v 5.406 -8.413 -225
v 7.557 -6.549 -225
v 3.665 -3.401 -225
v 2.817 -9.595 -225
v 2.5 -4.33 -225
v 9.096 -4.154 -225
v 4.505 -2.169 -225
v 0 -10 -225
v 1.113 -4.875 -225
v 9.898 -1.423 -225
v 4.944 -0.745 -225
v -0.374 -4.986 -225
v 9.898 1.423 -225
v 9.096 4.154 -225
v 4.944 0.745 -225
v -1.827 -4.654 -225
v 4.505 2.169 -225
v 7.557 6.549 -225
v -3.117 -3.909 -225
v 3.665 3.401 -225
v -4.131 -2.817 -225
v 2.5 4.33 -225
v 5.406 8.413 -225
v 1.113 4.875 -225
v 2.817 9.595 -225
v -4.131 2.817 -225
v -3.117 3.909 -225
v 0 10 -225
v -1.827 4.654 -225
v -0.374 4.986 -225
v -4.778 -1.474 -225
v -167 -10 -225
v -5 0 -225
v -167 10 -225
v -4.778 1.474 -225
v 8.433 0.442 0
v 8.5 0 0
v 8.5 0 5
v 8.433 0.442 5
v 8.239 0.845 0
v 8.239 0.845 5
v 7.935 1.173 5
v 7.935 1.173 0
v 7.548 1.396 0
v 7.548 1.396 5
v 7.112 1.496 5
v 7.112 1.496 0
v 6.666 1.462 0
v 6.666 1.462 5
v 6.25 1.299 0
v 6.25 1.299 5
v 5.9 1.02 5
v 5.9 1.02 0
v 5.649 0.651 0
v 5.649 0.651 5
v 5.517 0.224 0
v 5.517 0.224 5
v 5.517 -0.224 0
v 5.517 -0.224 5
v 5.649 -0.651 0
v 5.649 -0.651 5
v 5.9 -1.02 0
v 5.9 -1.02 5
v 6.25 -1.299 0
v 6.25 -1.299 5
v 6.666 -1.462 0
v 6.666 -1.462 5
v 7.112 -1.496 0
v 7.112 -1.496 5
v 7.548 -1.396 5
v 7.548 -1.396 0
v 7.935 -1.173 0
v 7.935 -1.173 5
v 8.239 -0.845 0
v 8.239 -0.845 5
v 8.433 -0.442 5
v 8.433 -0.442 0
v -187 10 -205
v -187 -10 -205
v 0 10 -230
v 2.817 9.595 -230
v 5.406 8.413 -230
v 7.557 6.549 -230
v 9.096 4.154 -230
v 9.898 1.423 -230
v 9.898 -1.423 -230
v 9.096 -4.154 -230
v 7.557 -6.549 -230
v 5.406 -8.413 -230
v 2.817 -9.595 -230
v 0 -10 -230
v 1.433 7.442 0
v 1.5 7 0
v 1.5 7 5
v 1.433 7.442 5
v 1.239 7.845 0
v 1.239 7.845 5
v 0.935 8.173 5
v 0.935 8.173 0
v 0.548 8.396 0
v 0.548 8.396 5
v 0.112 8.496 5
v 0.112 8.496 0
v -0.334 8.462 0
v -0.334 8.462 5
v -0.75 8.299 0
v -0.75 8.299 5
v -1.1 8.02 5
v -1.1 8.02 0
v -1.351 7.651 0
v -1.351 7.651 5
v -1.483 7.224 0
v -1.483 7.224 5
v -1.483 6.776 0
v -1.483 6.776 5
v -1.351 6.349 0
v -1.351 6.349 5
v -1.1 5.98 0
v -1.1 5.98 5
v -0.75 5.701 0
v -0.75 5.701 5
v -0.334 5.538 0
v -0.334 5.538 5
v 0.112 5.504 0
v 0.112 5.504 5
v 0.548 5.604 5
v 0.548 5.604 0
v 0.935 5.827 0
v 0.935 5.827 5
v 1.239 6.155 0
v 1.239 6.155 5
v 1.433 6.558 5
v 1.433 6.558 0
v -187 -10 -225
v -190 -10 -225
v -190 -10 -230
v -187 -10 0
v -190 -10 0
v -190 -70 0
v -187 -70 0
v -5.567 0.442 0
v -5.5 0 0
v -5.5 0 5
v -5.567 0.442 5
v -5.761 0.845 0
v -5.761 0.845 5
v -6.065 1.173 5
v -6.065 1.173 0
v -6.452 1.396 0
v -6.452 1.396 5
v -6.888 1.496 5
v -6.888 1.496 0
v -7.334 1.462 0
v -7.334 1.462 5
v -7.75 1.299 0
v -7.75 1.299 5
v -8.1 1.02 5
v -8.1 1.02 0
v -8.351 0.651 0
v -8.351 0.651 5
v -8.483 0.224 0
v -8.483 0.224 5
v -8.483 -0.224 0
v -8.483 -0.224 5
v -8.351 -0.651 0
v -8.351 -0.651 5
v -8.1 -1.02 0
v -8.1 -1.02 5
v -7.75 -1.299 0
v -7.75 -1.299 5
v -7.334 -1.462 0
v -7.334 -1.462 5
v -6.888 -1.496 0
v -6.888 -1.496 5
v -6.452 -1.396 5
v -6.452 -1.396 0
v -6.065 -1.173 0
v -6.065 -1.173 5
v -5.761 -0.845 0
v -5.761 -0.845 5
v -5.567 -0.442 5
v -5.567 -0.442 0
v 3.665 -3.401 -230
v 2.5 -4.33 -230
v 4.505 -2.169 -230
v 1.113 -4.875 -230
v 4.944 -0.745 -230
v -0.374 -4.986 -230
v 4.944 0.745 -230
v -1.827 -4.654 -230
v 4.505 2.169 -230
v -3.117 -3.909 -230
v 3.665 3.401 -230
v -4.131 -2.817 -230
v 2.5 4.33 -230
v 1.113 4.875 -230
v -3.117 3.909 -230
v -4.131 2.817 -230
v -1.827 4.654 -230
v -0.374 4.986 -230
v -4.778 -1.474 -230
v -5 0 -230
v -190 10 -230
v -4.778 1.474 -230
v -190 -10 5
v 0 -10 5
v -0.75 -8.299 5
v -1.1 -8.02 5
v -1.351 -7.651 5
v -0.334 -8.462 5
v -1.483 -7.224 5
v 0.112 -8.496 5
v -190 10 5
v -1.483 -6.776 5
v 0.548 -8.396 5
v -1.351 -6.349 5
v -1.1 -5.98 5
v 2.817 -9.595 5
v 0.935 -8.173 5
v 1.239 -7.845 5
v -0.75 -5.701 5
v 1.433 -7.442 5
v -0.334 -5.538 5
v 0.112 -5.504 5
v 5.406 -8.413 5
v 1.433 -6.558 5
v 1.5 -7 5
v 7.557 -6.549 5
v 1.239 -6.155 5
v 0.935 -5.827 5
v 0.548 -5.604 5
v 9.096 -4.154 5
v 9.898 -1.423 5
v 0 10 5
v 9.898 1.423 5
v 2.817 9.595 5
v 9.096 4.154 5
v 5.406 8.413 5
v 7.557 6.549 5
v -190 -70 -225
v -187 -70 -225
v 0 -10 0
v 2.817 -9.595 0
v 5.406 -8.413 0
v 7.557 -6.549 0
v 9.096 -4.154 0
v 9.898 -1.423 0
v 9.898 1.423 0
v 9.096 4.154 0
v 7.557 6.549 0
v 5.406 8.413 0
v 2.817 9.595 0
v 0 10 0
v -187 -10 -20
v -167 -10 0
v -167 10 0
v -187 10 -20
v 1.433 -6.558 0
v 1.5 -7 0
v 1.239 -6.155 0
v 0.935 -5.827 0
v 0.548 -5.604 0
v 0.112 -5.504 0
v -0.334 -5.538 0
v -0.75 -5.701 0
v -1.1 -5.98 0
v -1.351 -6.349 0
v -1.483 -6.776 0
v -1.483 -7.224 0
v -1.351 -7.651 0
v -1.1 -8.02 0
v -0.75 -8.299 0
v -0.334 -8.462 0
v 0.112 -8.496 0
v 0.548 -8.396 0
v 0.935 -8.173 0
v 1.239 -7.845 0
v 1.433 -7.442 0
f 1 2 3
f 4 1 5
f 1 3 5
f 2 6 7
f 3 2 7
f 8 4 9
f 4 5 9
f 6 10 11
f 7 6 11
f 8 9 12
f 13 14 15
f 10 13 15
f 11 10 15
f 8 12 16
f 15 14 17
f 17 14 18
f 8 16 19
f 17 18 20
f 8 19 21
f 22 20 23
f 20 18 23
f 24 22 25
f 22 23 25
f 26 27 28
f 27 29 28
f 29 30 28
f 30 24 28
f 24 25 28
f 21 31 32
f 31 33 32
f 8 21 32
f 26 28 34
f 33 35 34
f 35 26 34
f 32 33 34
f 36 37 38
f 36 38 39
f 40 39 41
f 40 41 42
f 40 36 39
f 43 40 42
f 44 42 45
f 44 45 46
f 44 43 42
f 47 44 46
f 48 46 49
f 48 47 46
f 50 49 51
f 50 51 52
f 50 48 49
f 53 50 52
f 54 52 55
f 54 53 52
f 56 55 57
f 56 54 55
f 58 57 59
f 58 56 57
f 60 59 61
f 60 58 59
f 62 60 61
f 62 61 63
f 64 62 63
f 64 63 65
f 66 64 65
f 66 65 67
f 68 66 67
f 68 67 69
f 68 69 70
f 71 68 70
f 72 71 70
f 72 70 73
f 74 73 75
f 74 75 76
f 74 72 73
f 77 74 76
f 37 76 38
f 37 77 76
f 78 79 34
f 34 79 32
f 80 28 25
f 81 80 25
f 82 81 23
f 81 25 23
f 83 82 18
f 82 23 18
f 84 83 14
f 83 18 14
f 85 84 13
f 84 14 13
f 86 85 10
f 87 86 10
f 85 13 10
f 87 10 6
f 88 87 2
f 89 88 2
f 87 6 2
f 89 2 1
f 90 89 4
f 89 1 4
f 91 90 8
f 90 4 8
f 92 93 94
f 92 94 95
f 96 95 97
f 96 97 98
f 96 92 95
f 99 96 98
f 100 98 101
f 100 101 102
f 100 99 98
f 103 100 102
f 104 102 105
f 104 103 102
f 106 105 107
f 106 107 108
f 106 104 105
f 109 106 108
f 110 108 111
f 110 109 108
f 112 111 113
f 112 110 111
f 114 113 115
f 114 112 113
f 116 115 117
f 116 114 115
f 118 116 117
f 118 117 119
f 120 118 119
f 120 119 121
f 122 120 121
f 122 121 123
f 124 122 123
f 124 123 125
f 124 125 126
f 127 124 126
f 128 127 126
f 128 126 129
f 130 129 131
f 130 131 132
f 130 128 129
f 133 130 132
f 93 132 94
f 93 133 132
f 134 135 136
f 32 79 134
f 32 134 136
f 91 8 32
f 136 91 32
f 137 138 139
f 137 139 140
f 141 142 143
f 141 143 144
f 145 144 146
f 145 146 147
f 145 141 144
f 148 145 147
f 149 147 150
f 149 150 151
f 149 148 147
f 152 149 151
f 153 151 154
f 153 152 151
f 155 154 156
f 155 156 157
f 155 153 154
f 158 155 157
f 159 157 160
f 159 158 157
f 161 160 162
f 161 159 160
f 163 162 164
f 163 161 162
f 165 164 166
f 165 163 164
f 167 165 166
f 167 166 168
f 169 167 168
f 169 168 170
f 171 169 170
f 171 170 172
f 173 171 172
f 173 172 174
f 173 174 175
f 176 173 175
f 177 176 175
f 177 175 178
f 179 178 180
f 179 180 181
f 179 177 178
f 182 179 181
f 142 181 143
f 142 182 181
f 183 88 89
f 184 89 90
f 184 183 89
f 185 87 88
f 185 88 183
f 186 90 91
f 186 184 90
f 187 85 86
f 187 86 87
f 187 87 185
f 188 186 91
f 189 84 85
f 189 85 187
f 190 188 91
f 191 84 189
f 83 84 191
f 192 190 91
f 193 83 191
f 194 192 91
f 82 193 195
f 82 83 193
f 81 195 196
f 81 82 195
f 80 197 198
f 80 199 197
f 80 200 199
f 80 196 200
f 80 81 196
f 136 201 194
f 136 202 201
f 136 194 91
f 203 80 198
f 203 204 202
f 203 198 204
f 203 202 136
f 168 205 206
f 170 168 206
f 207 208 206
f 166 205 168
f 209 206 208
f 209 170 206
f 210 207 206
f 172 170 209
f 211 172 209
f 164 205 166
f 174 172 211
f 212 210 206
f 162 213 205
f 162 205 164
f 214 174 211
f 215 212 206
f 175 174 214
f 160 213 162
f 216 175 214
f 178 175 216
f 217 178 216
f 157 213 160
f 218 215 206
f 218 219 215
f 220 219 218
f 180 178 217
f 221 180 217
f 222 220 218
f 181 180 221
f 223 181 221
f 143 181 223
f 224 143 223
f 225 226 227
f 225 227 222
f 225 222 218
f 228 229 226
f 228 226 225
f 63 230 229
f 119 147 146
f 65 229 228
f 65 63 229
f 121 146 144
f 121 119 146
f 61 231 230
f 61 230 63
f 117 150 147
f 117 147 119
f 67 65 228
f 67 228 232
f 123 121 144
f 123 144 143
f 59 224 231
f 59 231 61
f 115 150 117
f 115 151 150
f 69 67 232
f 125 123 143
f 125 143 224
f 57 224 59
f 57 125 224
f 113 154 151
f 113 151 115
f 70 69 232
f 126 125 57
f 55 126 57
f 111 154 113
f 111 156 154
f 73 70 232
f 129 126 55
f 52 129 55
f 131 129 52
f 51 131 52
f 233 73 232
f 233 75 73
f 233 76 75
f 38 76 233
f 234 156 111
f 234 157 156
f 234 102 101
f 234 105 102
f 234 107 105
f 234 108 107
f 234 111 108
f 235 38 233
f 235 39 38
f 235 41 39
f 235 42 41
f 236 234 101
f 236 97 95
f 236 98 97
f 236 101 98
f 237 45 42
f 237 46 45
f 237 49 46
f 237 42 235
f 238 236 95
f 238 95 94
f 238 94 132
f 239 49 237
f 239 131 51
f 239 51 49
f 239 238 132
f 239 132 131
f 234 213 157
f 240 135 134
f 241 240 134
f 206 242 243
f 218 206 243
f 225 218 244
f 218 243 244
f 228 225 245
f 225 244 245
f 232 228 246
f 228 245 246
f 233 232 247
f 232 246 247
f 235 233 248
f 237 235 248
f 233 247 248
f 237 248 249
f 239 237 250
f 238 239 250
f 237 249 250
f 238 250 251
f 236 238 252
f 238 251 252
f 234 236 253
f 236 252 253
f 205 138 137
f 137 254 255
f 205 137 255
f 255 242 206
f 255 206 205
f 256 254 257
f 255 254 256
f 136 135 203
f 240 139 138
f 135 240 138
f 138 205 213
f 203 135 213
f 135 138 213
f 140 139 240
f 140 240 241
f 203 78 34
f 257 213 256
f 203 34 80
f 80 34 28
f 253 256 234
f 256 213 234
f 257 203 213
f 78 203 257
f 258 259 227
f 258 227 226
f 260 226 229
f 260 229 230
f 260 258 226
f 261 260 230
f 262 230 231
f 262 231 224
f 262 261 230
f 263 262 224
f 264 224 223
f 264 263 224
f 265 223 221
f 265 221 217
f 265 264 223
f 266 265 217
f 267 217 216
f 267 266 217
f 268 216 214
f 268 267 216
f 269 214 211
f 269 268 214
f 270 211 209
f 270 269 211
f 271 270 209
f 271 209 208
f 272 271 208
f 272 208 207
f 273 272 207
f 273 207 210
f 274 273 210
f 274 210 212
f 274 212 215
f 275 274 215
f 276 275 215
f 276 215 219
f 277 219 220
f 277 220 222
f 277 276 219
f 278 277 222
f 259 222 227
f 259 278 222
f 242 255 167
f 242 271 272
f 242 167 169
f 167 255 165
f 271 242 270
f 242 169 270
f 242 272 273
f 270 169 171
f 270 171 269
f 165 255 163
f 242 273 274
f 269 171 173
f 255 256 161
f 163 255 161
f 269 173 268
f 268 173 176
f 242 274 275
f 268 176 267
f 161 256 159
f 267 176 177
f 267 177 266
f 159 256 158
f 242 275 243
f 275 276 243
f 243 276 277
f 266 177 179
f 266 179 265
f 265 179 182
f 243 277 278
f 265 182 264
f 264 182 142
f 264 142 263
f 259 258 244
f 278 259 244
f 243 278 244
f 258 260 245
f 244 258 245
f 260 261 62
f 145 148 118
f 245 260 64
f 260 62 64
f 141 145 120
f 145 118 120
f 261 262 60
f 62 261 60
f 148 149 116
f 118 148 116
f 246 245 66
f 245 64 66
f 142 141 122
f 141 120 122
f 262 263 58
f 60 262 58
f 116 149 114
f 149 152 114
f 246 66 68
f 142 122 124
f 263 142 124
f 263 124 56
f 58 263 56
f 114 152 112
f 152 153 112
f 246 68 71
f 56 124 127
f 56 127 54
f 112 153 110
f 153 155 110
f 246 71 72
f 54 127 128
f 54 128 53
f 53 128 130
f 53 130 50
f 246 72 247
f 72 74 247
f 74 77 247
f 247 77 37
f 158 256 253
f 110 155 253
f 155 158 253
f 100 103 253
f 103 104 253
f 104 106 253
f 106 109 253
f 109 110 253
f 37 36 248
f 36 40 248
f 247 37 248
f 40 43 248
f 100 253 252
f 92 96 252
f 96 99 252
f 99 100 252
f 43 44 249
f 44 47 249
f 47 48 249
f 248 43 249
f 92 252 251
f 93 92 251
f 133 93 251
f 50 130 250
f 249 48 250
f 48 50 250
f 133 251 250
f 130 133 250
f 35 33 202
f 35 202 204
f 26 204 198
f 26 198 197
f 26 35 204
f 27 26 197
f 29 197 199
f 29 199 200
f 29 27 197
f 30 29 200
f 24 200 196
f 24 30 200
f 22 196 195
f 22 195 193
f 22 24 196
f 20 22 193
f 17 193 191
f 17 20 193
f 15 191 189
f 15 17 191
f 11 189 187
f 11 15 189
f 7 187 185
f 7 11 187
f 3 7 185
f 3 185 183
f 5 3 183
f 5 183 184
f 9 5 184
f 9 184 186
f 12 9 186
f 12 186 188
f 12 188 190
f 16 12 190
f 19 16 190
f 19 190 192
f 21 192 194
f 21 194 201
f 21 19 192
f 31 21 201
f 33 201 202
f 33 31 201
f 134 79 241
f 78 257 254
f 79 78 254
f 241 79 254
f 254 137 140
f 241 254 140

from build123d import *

# Parameters (mm, degrees)
SKETCH_1_R      = 1.5
EXTRUDE_1_DEPTH = 5
EXTRUDE_2_DEPTH = 225
RIB_1_REACH     = 307.164
SKETCH_3_WALL_W = 640.612052034
SKETCH_3_WALL_H = 20
SKETCH_4_R      = 5
EXTRUDE_3_DEPTH = 5


with BuildPart() as part:
    # 草图1 → 凸台-拉伸1 (new body)
    with BuildSketch(Plane.XY):
        with BuildLine():
            Line((0, 10), (-190, 10))
            Line((-190, 10), (-190, -10))
            Line((-190, -10), (0, -10))
            ThreePointArc((0, -10), (10, 0), (0, 10))
        make_face()
        with Locations((7, 0)):
            Circle(SKETCH_1_R, mode=Mode.SUBTRACT)
        with Locations((0, -7)):
            Circle(SKETCH_1_R, mode=Mode.SUBTRACT)
        with Locations((-7, 0)):
            Circle(SKETCH_1_R, mode=Mode.SUBTRACT)
        with Locations((0, 7)):
            Circle(SKETCH_1_R, mode=Mode.SUBTRACT)
    extrude(amount=EXTRUDE_1_DEPTH)

    # 草图2 → 凸台-拉伸2 (add)
    with BuildSketch(Plane(origin=(0, 0, 0), x_dir=(-1, 0, 0), z_dir=(0, 0, -1))):
        Polygon((190, 10), (190, -10), (190, -70), (187, -70), (187, -10), (187, 10), align=None)
    extrude(amount=EXTRUDE_2_DEPTH)

    # 草图3 wall → 筋1 (add, up to next)
    with BuildSketch(Plane(origin=(-177, 10, -10), x_dir=(0.707106781187, 0, 0.707106781187), z_dir=(0.707106781187, 0, -0.707106781187)), mode=Mode.PRIVATE) as rib_1_sk1:
        with Locations((0, 10)):
            Rectangle(SKETCH_3_WALL_W, SKETCH_3_WALL_H)
    rib_1_tool1 = extrude(rib_1_sk1.sketch, amount=-RIB_1_REACH, mode=Mode.PRIVATE) - part.part
    rib_1 = rib_1_tool1.solids().sort_by_distance((-177, 10, -10))[0]
    add(rib_1)

    # 草图4 → 凸台-拉伸3 (add)
    with BuildSketch(Plane(origin=(0, 0, -225), x_dir=(-1, 0, 0), z_dir=(0, 0, -1))):
        with BuildLine():
            Line((190, -10), (190, 10))
            Line((190, 10), (0, 10))
            ThreePointArc((0, 10), (-10, 0), (0, -10))
            Line((0, -10), (190, -10))
        make_face()
        Circle(SKETCH_4_R, mode=Mode.SUBTRACT)
    extrude(amount=EXTRUDE_3_DEPTH)

    # 镜向1: 筋1 across plane
    add(rib_1.mirror(Plane.XY.offset(-112.5)))


solid = part.part
